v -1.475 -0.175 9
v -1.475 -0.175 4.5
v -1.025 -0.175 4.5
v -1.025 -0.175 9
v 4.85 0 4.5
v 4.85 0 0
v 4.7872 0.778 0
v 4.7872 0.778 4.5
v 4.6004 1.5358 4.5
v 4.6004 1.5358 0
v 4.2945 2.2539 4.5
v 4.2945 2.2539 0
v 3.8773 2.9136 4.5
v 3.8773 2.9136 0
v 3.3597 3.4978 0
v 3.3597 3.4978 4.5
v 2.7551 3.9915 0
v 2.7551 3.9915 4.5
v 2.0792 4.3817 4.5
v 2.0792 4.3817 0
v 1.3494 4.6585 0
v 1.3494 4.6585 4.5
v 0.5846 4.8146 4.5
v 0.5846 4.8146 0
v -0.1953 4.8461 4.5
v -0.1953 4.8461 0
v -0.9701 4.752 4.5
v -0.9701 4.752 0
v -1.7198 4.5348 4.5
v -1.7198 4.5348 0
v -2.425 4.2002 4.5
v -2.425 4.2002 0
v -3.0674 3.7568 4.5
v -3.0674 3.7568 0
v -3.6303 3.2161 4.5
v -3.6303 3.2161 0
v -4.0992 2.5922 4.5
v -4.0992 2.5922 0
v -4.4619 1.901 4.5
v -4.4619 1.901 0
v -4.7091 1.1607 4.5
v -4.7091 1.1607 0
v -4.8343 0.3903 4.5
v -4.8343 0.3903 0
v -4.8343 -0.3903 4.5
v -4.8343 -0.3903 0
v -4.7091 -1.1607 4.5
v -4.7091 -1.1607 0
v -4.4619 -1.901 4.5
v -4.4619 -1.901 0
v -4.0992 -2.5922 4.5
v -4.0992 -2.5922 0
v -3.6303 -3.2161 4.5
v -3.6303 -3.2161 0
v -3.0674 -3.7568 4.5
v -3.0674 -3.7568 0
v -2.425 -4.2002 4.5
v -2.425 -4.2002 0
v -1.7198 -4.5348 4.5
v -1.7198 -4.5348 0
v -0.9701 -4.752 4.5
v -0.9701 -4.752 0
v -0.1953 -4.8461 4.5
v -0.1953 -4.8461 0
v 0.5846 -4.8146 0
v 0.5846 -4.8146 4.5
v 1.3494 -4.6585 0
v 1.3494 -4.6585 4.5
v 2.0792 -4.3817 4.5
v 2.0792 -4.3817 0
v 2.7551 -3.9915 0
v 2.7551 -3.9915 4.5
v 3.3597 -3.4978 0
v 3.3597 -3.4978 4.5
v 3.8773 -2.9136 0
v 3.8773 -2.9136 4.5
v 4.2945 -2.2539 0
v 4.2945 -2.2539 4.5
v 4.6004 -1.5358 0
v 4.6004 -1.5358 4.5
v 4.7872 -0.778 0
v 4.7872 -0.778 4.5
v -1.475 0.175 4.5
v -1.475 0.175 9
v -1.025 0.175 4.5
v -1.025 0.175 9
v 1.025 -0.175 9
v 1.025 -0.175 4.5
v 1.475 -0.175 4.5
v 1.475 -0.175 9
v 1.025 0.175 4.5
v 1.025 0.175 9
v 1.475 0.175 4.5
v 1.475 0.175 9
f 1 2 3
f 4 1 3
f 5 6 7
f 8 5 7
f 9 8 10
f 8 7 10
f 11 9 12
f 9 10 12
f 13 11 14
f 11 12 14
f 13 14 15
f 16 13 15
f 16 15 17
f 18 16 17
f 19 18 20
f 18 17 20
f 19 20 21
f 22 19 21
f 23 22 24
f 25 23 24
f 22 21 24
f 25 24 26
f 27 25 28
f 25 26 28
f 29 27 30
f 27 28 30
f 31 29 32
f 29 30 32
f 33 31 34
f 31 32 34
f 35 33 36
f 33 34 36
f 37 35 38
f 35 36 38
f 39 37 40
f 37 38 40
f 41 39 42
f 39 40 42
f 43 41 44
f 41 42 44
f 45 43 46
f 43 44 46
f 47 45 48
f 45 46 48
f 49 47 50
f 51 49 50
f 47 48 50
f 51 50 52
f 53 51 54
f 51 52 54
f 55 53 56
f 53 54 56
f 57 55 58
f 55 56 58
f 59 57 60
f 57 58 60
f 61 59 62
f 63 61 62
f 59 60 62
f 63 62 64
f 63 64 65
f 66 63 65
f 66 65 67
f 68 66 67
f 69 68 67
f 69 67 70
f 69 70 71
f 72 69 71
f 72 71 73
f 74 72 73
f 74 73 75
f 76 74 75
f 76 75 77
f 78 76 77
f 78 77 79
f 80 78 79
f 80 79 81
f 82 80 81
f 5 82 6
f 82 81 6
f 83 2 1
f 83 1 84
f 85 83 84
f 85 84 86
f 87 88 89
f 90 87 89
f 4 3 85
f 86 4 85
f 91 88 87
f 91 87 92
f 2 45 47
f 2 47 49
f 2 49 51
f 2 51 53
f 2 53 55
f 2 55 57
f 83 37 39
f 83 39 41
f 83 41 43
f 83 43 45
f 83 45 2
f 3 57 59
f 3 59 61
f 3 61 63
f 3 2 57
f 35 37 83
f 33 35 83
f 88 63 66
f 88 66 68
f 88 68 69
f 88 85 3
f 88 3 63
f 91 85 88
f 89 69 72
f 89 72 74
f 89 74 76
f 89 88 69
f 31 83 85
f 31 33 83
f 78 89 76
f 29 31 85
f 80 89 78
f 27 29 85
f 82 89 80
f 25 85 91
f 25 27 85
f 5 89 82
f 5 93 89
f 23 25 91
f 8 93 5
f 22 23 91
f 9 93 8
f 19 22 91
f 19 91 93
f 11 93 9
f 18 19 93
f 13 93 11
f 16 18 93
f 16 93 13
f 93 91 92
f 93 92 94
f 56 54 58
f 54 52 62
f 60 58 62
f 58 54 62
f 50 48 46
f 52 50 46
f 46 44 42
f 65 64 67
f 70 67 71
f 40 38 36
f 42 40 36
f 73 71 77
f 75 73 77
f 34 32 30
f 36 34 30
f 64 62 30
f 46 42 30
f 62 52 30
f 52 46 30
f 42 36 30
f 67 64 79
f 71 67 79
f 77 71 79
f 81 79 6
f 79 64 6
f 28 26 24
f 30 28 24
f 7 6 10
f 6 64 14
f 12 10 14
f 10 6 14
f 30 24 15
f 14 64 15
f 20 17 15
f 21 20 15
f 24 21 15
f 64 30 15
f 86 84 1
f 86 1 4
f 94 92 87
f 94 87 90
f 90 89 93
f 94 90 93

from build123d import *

# Parameters (mm, degrees)
SKETCH2_R           = 4.85
BOSS_EXTRUDE1_DEPTH = 4.5
SKETCH3_W           = 0.45
SKETCH3_H           = 0.35
BOSS_EXTRUDE2_DEPTH = 4.5


with BuildPart() as part:
    # Sketch2 → Boss-Extrude1 (new body)
    with BuildSketch(Plane.XY):
        Circle(SKETCH2_R)
    extrude(amount=BOSS_EXTRUDE1_DEPTH)

    # Sketch3 → Boss-Extrude2 (add)
    with BuildSketch(Plane.XY.offset(4.5)):
        with Locations((-1.25, 0)):
            Rectangle(SKETCH3_W, SKETCH3_H)
        with Locations((1.25, 0)):
            Rectangle(SKETCH3_W, SKETCH3_H)
    extrude(amount=BOSS_EXTRUDE2_DEPTH)


solid = part.part
